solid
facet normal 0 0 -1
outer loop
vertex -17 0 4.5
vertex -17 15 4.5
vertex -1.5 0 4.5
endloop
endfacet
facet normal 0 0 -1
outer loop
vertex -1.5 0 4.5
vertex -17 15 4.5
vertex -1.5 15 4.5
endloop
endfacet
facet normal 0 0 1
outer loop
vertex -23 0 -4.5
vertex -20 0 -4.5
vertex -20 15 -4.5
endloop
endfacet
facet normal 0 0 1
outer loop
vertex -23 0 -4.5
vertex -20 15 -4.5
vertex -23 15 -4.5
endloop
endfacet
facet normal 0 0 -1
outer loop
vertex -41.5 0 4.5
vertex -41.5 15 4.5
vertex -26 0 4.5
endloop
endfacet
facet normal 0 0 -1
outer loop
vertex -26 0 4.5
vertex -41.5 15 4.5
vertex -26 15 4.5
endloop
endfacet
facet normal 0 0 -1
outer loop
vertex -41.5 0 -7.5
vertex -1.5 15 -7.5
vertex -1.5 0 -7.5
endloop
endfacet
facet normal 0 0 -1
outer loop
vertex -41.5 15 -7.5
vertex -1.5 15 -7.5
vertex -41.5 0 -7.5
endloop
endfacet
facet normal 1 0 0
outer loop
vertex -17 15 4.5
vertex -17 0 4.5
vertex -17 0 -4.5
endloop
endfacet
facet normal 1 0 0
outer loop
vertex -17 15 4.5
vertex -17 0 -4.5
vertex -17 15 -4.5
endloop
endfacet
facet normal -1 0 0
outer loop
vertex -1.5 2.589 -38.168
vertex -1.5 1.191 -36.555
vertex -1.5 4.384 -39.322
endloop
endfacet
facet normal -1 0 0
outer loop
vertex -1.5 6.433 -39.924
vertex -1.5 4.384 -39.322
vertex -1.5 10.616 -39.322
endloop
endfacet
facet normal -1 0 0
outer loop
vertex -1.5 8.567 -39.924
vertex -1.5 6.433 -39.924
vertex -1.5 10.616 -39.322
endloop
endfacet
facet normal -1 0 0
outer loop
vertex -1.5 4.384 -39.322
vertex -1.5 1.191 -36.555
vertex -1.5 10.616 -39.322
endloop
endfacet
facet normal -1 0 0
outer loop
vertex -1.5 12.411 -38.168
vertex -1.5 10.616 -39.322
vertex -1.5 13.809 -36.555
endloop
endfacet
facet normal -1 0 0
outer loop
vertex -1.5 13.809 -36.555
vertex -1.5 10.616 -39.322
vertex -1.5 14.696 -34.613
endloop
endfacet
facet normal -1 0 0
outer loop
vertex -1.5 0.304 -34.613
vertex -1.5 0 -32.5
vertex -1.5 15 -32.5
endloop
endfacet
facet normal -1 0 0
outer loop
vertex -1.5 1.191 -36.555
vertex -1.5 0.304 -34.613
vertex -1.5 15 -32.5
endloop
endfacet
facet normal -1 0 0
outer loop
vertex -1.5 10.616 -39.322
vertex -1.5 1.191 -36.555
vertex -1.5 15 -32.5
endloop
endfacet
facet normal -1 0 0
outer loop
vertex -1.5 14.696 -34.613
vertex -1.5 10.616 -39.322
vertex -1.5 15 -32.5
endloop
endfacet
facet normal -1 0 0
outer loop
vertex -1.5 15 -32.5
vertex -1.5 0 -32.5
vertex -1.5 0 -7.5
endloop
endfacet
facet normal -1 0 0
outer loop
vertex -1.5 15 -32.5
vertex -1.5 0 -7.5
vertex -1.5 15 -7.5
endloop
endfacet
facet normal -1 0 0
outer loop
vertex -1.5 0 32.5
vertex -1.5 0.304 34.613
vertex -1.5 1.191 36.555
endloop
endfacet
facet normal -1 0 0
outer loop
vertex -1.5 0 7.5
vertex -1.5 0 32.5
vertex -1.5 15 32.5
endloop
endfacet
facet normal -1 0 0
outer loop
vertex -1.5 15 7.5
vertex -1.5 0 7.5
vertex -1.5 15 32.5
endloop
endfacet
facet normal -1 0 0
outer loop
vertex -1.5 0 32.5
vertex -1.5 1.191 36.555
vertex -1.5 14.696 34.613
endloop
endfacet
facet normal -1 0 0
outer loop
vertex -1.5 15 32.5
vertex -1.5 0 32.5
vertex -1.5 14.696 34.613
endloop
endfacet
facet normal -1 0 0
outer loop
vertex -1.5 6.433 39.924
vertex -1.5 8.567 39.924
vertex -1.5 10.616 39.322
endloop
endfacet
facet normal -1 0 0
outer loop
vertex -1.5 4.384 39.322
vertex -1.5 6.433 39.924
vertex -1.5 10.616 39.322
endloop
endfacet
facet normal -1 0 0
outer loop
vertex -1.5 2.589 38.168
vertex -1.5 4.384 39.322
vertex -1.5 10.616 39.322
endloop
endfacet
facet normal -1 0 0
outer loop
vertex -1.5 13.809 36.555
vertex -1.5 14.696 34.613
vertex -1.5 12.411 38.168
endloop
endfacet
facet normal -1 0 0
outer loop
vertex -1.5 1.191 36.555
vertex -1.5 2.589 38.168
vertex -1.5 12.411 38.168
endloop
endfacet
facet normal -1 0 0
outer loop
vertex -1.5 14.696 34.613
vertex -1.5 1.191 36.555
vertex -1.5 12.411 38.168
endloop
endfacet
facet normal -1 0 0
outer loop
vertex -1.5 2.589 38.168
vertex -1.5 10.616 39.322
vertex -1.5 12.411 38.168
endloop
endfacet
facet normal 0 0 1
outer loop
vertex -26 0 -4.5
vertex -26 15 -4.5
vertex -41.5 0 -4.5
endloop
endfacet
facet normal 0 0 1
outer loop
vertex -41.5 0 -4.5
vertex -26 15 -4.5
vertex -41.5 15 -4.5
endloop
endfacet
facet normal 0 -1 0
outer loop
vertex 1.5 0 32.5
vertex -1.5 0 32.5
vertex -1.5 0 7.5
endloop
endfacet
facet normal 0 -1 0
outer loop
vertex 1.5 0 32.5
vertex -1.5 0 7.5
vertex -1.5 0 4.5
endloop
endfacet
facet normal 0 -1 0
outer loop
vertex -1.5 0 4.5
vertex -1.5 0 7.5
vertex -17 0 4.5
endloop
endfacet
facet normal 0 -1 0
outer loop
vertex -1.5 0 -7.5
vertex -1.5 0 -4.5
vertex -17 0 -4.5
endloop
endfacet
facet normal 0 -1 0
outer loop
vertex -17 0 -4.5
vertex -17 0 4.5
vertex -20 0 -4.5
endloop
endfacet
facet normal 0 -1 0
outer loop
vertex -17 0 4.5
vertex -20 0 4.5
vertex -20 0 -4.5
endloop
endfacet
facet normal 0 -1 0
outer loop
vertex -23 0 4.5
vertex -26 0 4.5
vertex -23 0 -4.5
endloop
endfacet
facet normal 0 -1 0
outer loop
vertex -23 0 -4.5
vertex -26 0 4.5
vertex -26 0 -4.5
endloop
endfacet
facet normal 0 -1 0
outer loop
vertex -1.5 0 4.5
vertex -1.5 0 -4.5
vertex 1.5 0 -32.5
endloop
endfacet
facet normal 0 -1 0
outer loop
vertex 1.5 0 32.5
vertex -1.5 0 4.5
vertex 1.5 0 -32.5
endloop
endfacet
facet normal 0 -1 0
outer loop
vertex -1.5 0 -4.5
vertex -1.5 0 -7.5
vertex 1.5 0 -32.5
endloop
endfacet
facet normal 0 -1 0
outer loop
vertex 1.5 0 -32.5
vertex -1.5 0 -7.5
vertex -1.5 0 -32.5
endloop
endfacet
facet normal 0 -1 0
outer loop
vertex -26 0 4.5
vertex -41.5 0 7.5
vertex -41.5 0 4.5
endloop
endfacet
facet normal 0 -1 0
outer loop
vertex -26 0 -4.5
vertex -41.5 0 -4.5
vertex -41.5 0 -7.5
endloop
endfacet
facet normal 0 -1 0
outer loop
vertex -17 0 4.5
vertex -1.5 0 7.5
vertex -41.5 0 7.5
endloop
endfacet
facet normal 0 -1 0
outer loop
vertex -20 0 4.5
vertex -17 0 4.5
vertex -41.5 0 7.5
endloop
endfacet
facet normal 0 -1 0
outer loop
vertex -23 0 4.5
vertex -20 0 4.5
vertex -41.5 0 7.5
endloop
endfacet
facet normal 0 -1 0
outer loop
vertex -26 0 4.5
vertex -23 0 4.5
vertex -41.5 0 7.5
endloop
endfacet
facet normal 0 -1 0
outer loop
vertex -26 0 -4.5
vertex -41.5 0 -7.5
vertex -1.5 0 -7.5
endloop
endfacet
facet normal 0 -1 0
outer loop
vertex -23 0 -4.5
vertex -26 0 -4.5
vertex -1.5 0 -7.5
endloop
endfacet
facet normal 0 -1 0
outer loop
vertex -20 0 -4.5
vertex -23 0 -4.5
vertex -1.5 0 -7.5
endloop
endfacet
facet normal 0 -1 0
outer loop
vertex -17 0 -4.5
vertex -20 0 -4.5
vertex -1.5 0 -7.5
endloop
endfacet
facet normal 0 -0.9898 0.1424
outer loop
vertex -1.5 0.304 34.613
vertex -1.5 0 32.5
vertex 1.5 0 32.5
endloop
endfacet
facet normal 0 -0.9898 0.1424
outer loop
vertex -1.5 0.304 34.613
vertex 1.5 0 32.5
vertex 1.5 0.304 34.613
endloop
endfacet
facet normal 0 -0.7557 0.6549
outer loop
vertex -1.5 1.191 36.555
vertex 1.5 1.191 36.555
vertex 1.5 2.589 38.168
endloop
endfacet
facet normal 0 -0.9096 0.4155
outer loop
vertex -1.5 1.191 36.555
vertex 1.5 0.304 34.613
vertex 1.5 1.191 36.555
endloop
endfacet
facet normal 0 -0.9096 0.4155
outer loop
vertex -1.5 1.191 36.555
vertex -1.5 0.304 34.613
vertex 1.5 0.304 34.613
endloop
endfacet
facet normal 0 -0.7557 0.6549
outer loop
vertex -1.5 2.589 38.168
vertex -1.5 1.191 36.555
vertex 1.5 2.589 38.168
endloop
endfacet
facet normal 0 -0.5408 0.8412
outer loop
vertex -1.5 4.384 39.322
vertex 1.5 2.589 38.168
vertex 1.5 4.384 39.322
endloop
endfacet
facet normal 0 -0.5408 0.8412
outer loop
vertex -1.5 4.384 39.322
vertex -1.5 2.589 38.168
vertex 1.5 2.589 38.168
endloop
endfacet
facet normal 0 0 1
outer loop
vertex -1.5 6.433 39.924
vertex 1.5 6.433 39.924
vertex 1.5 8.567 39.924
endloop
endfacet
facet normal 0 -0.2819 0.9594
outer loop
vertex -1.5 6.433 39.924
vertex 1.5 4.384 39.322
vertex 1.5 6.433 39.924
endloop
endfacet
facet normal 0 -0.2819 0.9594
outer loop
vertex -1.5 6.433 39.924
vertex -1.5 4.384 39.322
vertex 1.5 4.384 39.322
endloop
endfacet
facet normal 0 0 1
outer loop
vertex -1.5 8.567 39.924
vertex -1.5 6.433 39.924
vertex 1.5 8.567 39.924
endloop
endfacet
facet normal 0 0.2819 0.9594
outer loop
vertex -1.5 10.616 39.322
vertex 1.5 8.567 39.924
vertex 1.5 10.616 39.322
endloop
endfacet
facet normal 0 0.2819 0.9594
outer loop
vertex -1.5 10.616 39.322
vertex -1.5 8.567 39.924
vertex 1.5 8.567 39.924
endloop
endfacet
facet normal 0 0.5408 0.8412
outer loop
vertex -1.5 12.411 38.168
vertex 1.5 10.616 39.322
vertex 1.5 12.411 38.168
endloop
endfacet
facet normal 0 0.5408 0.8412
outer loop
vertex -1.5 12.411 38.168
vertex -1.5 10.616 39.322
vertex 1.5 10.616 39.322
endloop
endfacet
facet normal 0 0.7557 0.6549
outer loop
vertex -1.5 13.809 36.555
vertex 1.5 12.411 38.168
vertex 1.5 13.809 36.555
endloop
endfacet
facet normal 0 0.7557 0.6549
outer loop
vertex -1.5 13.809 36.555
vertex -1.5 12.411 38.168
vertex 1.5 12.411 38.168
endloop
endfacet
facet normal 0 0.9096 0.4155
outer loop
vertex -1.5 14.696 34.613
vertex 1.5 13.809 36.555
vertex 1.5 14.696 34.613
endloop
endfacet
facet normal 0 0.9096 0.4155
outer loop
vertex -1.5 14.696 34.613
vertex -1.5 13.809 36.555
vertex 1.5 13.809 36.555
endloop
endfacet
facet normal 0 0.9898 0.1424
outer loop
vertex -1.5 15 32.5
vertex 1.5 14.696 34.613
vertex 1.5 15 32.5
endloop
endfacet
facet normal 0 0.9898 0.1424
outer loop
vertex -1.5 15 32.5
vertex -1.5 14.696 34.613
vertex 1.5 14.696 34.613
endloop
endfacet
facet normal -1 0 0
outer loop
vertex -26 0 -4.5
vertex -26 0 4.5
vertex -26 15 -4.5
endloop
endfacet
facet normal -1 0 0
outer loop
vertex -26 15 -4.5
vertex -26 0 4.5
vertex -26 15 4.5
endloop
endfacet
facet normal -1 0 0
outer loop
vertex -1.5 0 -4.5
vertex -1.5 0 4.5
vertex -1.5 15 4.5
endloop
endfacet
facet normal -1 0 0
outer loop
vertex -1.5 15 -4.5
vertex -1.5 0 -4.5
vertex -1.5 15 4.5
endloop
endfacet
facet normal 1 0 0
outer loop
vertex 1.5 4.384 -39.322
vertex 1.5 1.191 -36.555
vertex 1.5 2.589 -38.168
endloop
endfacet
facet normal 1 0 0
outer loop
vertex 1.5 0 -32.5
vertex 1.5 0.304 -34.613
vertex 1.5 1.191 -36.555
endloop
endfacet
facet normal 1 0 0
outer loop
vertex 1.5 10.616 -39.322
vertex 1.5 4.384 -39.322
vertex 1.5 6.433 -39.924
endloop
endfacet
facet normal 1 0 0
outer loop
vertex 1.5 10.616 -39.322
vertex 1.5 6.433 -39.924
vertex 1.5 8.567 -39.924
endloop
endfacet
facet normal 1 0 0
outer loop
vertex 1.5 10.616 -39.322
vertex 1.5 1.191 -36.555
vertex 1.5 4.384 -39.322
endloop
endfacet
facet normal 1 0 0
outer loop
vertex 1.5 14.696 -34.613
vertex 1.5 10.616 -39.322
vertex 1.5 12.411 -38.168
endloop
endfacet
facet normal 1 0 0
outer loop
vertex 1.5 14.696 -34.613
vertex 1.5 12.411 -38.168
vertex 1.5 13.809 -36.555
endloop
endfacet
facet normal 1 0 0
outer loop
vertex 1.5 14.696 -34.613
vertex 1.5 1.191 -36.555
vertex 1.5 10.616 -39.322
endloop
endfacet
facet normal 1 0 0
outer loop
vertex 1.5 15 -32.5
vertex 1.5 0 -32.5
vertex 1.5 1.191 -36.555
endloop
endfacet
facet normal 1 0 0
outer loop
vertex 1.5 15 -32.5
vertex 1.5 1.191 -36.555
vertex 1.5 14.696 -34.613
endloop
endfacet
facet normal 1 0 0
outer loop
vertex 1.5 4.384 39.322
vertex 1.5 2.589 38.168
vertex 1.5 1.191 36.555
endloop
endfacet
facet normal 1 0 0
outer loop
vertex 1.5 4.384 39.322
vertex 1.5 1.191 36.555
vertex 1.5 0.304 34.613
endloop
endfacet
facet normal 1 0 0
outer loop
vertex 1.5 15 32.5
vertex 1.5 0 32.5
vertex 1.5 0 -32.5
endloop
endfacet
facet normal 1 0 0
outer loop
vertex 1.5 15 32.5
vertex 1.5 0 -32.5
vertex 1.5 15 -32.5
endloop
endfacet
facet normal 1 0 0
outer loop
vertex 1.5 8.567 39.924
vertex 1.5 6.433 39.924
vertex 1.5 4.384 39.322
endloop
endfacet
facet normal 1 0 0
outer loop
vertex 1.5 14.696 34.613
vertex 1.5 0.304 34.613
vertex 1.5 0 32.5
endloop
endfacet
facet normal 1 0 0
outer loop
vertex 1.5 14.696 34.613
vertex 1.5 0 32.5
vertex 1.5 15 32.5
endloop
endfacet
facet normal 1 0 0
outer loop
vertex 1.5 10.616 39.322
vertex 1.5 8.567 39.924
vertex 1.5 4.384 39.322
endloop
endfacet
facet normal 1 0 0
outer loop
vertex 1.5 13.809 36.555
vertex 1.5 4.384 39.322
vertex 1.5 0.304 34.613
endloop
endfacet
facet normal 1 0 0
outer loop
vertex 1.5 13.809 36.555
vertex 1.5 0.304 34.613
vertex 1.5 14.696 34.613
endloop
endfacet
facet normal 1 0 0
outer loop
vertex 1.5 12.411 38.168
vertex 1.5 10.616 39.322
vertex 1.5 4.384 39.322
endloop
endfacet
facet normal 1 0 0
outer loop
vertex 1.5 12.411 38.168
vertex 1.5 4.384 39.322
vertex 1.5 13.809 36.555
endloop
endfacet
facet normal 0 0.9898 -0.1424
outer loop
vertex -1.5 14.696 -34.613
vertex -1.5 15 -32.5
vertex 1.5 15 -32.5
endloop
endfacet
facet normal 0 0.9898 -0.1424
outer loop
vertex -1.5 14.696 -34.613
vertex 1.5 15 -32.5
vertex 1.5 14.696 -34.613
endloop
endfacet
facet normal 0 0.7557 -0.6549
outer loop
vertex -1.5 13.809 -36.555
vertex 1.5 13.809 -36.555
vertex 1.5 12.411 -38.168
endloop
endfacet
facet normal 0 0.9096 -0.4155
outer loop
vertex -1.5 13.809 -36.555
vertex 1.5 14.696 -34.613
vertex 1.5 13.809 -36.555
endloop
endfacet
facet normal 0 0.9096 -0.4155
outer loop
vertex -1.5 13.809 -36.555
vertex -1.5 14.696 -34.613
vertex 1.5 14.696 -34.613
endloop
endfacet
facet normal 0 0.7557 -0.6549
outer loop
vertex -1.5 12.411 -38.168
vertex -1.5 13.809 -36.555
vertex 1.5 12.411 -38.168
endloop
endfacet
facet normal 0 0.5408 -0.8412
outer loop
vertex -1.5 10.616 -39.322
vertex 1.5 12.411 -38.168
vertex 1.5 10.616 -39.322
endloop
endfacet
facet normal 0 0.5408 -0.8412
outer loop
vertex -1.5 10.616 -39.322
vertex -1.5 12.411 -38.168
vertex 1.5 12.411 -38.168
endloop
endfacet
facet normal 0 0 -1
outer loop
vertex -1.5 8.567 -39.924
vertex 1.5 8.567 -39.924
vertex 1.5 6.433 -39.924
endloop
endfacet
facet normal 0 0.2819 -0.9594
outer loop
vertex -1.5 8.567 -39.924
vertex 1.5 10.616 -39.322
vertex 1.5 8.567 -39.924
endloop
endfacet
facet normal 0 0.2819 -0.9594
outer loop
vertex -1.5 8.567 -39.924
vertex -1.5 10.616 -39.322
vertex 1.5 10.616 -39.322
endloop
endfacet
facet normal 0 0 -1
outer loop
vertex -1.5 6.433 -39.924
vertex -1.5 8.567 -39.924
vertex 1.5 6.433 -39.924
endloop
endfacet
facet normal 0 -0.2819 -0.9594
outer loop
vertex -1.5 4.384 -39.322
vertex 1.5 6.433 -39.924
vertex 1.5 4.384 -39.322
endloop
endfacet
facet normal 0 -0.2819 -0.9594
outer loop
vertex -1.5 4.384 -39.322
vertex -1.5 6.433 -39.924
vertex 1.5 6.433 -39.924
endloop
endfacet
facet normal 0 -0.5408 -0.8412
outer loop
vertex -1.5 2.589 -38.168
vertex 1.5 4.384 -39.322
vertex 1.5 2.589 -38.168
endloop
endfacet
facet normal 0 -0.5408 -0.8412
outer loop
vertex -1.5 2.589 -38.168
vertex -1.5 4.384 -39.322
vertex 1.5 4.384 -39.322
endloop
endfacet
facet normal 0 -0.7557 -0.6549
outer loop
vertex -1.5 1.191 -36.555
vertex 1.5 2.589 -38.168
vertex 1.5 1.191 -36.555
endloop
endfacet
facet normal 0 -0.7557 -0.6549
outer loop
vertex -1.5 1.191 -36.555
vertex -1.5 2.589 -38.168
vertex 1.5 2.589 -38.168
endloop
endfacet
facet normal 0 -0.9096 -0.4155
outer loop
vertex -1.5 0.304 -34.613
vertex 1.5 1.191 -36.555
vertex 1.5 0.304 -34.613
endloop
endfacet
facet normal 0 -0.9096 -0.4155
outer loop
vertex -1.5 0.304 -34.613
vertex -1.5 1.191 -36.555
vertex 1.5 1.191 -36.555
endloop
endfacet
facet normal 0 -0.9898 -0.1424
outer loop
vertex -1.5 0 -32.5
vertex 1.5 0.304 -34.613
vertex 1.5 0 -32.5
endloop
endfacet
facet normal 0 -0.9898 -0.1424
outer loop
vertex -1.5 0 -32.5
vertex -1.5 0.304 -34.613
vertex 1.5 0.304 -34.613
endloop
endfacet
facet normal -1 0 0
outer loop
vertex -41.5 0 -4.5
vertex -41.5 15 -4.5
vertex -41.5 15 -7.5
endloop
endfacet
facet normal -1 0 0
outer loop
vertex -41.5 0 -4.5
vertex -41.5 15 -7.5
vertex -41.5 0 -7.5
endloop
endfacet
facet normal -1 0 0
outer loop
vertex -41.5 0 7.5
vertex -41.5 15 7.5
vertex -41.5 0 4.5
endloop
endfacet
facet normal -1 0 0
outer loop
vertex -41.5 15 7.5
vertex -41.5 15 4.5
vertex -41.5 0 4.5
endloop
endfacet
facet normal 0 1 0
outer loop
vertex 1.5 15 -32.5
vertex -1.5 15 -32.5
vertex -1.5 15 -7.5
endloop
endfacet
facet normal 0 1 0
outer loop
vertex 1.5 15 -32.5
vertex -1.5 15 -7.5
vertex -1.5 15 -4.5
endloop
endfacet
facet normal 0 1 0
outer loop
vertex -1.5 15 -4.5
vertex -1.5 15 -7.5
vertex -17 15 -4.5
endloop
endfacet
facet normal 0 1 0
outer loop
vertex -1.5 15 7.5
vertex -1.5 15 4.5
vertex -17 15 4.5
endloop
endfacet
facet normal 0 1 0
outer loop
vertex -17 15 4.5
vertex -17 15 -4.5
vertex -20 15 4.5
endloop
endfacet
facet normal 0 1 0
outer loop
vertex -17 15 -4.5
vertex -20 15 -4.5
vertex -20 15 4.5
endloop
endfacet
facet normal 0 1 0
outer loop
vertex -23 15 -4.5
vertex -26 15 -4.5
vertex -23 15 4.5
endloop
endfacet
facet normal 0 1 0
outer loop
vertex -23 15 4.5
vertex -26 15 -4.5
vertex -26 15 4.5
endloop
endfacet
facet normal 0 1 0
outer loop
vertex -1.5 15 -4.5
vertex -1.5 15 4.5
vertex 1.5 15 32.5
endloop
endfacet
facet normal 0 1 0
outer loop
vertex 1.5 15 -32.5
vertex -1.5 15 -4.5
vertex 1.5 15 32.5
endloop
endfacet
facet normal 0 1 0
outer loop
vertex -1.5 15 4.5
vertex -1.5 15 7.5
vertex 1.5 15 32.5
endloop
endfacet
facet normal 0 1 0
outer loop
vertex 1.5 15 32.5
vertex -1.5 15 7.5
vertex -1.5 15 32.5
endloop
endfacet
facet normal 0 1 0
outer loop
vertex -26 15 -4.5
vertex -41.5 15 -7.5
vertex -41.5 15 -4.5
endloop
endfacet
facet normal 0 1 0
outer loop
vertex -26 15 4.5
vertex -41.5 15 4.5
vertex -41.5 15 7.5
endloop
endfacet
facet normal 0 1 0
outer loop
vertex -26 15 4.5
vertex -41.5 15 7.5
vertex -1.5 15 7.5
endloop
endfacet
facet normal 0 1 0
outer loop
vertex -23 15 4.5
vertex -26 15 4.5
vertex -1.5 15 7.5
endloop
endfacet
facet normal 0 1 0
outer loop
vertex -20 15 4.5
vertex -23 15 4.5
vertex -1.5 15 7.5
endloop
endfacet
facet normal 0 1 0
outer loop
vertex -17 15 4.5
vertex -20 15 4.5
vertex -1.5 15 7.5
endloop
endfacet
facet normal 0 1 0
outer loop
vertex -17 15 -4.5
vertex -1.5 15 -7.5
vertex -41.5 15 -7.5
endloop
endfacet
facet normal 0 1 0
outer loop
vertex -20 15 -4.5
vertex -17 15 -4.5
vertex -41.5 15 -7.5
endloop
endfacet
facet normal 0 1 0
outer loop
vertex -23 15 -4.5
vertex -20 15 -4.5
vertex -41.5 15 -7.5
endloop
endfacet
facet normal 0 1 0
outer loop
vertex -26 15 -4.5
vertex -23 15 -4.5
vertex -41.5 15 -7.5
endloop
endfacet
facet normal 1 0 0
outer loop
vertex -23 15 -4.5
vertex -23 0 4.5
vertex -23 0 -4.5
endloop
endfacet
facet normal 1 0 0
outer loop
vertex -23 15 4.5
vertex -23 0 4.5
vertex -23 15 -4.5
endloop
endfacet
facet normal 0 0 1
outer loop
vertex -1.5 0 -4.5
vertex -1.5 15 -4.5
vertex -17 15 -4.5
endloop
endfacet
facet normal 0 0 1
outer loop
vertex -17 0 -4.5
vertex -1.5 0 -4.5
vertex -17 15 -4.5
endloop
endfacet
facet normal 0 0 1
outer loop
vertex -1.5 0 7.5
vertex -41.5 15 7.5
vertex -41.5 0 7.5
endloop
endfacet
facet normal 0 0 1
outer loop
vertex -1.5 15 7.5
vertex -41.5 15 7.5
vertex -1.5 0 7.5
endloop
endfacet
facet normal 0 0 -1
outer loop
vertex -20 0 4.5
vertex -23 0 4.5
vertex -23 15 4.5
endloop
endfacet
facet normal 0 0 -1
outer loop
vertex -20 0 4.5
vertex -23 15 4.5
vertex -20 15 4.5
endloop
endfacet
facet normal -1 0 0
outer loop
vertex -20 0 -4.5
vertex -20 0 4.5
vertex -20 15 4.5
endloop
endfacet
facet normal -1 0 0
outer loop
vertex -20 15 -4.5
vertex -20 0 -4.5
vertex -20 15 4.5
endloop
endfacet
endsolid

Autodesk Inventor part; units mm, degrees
ref_plane "XZ Plane" through (0, 0, 0) normal (0, 1, 0) x (-1, 0, 0)
sketch "Sketch1" plane through (0, 0, 0) normal (1, 0, 0) x (0, 1, 0)
  line L0 (15, 0) -> (15, 32.5)
  line L1 (15, 6) -> (0, 6)
  line L2 (0, 32.5) -> (0, 0)
  line L3 (15, 0) -> (15, 32.5)
  line L4 (15, 6) -> (0, 6)
  line L5 (0, 32.5) -> (0, 0)
  arc A0 (15, 32.5) -> (0, 32.5) centre (7.5, 32.5) ccw
  line L6 (15, 0) -> (0, 0)
  line L7 (15, 0) -> (15, -32.5)
  line L8 (15, -6) -> (0, -6)
  line L9 (0, -32.5) -> (0, 0)
  line L10 (15, -6) -> (0, -6)
  line L11 (15, 0) -> (15, -32.5)
  line L12 (0, -32.5) -> (0, 0)
  arc A1 (0, -32.5) -> (15, -32.5) centre (7.5, -32.5) ccw
  dimension "d25" = 65
  dimension "d26" = 15
ref_plane "Work Plane1" through (0, 0, 6) normal (0, 0, 1) x (1, 0, 0)
ref_plane "Work Plane2" through (0, 15, -6) normal (0, 0, -1) x (-1, 0, 0)
extrude "Extrusion1" add sketch "Sketch1" along normal mid plane 3
sketch "Sketch2" plane through (0, 0, 6) normal (0, 0, 1) x (1, 0, 0)
  line L0 (-1.5, 15) -> (-41.5, 15)
  line L1 (-41.5, 15) -> (-41.5, 0)
  line L2 (-41.5, 0) -> (-1.5, 0)
  line L3 (-21.5, 15) -> (-21.5, 0)
  line L4 (-18.5, 15) -> (-18.5, 0)
  line L5 (-24.5, 15) -> (-24.5, 0)
  line L6 (-1.5, 15) -> (-1.5, 0)
  line L7 (-1.5, 0) -> (0, 0)
  dimension "d30" = 40
  dimension "d31" = 3
  dimension "d32" = 3
sketch "Sketch3" plane through (0, 15, -6) normal (0, 0, -1) x (-1, 0, 0)
  line L0 (1.5, -15) -> (1.5, 0) projected
  line L1 (41.5, 0) -> (41.5, -15)
  line L2 (41.5, -15) -> (1.5, -15)
  line L3 (1.5, 0) -> (41.5, 0)
  line L4 (21.5, 0) -> (21.5, -15)
  line L5 (24.5, 0) -> (24.5, -15)
  line L6 (18.5, 0) -> (18.5, -15)
  line L7 (1.5, 0) -> (1.5, -15)
  point P0 (0, -15)
  dimension "d35" = 40
ref_plane "Work Plane5" through (-18.5, 0, 0) normal (1, 0, 0) x (0, 1, 0)
ref_plane "Work Plane6" through (-24.5, 15, 6) normal (1, 0, 0) x (0, 1, 0)
ref_plane "Work Plane7" through (-41.5, 15, 6) normal (1, 0, 0) x (0, 1, 0)
sketch "Sketch5" plane through (-18.5, 0, 0) normal (1, 0, 0) x (0, 1, 0)
  line L0 (15, -32.5) -> (15, 32.5) projected
  line L1 (0, 0) -> (15, 0)
  line L2 (15, 0) -> (15, 6)
  line L3 (15, 6) -> (0, 6)
  line L4 (0, 6) -> (0, 0)
  line L5 (0, 0) -> (15, 0)
  line L6 (15, 0) -> (15, -6)
  line L7 (15, -6) -> (0, -6)
  line L8 (0, -6) -> (0, 0)
  dimension "d42" = 6
  dimension "d43" = 6
sketch "Sketch6" plane through (-24.5, 15, 6) normal (1, 0, 0) x (0, 1, 0)
  line L0 (-15, -6) -> (0, -6)
  line L1 (0, -6) -> (0, 0)
  line L2 (0, 0) -> (-15, 0)
  line L3 (-15, 0) -> (-15, -6)
  line L4 (0, -38.5) -> (0, 26.5) projected
  line L5 (-15, -6) -> (0, -6)
  line L6 (0, -6) -> (0, -12)
  line L7 (0, -12) -> (-15, -12)
  line L8 (-15, -12) -> (-15, -6)
  dimension "d44" = 6
extrude "Extrusion2" add sketch "Sketch2" along normal mid plane 3
extrude "Extrusion3" add sketch "Sketch3" along normal mid plane 3
extrude "Extrusion4" add sketch "Sketch6" along normal mid plane 3
extrude "Extrusion5" add sketch "Sketch5" along normal mid plane 3
properties part number "LegMiddle"
